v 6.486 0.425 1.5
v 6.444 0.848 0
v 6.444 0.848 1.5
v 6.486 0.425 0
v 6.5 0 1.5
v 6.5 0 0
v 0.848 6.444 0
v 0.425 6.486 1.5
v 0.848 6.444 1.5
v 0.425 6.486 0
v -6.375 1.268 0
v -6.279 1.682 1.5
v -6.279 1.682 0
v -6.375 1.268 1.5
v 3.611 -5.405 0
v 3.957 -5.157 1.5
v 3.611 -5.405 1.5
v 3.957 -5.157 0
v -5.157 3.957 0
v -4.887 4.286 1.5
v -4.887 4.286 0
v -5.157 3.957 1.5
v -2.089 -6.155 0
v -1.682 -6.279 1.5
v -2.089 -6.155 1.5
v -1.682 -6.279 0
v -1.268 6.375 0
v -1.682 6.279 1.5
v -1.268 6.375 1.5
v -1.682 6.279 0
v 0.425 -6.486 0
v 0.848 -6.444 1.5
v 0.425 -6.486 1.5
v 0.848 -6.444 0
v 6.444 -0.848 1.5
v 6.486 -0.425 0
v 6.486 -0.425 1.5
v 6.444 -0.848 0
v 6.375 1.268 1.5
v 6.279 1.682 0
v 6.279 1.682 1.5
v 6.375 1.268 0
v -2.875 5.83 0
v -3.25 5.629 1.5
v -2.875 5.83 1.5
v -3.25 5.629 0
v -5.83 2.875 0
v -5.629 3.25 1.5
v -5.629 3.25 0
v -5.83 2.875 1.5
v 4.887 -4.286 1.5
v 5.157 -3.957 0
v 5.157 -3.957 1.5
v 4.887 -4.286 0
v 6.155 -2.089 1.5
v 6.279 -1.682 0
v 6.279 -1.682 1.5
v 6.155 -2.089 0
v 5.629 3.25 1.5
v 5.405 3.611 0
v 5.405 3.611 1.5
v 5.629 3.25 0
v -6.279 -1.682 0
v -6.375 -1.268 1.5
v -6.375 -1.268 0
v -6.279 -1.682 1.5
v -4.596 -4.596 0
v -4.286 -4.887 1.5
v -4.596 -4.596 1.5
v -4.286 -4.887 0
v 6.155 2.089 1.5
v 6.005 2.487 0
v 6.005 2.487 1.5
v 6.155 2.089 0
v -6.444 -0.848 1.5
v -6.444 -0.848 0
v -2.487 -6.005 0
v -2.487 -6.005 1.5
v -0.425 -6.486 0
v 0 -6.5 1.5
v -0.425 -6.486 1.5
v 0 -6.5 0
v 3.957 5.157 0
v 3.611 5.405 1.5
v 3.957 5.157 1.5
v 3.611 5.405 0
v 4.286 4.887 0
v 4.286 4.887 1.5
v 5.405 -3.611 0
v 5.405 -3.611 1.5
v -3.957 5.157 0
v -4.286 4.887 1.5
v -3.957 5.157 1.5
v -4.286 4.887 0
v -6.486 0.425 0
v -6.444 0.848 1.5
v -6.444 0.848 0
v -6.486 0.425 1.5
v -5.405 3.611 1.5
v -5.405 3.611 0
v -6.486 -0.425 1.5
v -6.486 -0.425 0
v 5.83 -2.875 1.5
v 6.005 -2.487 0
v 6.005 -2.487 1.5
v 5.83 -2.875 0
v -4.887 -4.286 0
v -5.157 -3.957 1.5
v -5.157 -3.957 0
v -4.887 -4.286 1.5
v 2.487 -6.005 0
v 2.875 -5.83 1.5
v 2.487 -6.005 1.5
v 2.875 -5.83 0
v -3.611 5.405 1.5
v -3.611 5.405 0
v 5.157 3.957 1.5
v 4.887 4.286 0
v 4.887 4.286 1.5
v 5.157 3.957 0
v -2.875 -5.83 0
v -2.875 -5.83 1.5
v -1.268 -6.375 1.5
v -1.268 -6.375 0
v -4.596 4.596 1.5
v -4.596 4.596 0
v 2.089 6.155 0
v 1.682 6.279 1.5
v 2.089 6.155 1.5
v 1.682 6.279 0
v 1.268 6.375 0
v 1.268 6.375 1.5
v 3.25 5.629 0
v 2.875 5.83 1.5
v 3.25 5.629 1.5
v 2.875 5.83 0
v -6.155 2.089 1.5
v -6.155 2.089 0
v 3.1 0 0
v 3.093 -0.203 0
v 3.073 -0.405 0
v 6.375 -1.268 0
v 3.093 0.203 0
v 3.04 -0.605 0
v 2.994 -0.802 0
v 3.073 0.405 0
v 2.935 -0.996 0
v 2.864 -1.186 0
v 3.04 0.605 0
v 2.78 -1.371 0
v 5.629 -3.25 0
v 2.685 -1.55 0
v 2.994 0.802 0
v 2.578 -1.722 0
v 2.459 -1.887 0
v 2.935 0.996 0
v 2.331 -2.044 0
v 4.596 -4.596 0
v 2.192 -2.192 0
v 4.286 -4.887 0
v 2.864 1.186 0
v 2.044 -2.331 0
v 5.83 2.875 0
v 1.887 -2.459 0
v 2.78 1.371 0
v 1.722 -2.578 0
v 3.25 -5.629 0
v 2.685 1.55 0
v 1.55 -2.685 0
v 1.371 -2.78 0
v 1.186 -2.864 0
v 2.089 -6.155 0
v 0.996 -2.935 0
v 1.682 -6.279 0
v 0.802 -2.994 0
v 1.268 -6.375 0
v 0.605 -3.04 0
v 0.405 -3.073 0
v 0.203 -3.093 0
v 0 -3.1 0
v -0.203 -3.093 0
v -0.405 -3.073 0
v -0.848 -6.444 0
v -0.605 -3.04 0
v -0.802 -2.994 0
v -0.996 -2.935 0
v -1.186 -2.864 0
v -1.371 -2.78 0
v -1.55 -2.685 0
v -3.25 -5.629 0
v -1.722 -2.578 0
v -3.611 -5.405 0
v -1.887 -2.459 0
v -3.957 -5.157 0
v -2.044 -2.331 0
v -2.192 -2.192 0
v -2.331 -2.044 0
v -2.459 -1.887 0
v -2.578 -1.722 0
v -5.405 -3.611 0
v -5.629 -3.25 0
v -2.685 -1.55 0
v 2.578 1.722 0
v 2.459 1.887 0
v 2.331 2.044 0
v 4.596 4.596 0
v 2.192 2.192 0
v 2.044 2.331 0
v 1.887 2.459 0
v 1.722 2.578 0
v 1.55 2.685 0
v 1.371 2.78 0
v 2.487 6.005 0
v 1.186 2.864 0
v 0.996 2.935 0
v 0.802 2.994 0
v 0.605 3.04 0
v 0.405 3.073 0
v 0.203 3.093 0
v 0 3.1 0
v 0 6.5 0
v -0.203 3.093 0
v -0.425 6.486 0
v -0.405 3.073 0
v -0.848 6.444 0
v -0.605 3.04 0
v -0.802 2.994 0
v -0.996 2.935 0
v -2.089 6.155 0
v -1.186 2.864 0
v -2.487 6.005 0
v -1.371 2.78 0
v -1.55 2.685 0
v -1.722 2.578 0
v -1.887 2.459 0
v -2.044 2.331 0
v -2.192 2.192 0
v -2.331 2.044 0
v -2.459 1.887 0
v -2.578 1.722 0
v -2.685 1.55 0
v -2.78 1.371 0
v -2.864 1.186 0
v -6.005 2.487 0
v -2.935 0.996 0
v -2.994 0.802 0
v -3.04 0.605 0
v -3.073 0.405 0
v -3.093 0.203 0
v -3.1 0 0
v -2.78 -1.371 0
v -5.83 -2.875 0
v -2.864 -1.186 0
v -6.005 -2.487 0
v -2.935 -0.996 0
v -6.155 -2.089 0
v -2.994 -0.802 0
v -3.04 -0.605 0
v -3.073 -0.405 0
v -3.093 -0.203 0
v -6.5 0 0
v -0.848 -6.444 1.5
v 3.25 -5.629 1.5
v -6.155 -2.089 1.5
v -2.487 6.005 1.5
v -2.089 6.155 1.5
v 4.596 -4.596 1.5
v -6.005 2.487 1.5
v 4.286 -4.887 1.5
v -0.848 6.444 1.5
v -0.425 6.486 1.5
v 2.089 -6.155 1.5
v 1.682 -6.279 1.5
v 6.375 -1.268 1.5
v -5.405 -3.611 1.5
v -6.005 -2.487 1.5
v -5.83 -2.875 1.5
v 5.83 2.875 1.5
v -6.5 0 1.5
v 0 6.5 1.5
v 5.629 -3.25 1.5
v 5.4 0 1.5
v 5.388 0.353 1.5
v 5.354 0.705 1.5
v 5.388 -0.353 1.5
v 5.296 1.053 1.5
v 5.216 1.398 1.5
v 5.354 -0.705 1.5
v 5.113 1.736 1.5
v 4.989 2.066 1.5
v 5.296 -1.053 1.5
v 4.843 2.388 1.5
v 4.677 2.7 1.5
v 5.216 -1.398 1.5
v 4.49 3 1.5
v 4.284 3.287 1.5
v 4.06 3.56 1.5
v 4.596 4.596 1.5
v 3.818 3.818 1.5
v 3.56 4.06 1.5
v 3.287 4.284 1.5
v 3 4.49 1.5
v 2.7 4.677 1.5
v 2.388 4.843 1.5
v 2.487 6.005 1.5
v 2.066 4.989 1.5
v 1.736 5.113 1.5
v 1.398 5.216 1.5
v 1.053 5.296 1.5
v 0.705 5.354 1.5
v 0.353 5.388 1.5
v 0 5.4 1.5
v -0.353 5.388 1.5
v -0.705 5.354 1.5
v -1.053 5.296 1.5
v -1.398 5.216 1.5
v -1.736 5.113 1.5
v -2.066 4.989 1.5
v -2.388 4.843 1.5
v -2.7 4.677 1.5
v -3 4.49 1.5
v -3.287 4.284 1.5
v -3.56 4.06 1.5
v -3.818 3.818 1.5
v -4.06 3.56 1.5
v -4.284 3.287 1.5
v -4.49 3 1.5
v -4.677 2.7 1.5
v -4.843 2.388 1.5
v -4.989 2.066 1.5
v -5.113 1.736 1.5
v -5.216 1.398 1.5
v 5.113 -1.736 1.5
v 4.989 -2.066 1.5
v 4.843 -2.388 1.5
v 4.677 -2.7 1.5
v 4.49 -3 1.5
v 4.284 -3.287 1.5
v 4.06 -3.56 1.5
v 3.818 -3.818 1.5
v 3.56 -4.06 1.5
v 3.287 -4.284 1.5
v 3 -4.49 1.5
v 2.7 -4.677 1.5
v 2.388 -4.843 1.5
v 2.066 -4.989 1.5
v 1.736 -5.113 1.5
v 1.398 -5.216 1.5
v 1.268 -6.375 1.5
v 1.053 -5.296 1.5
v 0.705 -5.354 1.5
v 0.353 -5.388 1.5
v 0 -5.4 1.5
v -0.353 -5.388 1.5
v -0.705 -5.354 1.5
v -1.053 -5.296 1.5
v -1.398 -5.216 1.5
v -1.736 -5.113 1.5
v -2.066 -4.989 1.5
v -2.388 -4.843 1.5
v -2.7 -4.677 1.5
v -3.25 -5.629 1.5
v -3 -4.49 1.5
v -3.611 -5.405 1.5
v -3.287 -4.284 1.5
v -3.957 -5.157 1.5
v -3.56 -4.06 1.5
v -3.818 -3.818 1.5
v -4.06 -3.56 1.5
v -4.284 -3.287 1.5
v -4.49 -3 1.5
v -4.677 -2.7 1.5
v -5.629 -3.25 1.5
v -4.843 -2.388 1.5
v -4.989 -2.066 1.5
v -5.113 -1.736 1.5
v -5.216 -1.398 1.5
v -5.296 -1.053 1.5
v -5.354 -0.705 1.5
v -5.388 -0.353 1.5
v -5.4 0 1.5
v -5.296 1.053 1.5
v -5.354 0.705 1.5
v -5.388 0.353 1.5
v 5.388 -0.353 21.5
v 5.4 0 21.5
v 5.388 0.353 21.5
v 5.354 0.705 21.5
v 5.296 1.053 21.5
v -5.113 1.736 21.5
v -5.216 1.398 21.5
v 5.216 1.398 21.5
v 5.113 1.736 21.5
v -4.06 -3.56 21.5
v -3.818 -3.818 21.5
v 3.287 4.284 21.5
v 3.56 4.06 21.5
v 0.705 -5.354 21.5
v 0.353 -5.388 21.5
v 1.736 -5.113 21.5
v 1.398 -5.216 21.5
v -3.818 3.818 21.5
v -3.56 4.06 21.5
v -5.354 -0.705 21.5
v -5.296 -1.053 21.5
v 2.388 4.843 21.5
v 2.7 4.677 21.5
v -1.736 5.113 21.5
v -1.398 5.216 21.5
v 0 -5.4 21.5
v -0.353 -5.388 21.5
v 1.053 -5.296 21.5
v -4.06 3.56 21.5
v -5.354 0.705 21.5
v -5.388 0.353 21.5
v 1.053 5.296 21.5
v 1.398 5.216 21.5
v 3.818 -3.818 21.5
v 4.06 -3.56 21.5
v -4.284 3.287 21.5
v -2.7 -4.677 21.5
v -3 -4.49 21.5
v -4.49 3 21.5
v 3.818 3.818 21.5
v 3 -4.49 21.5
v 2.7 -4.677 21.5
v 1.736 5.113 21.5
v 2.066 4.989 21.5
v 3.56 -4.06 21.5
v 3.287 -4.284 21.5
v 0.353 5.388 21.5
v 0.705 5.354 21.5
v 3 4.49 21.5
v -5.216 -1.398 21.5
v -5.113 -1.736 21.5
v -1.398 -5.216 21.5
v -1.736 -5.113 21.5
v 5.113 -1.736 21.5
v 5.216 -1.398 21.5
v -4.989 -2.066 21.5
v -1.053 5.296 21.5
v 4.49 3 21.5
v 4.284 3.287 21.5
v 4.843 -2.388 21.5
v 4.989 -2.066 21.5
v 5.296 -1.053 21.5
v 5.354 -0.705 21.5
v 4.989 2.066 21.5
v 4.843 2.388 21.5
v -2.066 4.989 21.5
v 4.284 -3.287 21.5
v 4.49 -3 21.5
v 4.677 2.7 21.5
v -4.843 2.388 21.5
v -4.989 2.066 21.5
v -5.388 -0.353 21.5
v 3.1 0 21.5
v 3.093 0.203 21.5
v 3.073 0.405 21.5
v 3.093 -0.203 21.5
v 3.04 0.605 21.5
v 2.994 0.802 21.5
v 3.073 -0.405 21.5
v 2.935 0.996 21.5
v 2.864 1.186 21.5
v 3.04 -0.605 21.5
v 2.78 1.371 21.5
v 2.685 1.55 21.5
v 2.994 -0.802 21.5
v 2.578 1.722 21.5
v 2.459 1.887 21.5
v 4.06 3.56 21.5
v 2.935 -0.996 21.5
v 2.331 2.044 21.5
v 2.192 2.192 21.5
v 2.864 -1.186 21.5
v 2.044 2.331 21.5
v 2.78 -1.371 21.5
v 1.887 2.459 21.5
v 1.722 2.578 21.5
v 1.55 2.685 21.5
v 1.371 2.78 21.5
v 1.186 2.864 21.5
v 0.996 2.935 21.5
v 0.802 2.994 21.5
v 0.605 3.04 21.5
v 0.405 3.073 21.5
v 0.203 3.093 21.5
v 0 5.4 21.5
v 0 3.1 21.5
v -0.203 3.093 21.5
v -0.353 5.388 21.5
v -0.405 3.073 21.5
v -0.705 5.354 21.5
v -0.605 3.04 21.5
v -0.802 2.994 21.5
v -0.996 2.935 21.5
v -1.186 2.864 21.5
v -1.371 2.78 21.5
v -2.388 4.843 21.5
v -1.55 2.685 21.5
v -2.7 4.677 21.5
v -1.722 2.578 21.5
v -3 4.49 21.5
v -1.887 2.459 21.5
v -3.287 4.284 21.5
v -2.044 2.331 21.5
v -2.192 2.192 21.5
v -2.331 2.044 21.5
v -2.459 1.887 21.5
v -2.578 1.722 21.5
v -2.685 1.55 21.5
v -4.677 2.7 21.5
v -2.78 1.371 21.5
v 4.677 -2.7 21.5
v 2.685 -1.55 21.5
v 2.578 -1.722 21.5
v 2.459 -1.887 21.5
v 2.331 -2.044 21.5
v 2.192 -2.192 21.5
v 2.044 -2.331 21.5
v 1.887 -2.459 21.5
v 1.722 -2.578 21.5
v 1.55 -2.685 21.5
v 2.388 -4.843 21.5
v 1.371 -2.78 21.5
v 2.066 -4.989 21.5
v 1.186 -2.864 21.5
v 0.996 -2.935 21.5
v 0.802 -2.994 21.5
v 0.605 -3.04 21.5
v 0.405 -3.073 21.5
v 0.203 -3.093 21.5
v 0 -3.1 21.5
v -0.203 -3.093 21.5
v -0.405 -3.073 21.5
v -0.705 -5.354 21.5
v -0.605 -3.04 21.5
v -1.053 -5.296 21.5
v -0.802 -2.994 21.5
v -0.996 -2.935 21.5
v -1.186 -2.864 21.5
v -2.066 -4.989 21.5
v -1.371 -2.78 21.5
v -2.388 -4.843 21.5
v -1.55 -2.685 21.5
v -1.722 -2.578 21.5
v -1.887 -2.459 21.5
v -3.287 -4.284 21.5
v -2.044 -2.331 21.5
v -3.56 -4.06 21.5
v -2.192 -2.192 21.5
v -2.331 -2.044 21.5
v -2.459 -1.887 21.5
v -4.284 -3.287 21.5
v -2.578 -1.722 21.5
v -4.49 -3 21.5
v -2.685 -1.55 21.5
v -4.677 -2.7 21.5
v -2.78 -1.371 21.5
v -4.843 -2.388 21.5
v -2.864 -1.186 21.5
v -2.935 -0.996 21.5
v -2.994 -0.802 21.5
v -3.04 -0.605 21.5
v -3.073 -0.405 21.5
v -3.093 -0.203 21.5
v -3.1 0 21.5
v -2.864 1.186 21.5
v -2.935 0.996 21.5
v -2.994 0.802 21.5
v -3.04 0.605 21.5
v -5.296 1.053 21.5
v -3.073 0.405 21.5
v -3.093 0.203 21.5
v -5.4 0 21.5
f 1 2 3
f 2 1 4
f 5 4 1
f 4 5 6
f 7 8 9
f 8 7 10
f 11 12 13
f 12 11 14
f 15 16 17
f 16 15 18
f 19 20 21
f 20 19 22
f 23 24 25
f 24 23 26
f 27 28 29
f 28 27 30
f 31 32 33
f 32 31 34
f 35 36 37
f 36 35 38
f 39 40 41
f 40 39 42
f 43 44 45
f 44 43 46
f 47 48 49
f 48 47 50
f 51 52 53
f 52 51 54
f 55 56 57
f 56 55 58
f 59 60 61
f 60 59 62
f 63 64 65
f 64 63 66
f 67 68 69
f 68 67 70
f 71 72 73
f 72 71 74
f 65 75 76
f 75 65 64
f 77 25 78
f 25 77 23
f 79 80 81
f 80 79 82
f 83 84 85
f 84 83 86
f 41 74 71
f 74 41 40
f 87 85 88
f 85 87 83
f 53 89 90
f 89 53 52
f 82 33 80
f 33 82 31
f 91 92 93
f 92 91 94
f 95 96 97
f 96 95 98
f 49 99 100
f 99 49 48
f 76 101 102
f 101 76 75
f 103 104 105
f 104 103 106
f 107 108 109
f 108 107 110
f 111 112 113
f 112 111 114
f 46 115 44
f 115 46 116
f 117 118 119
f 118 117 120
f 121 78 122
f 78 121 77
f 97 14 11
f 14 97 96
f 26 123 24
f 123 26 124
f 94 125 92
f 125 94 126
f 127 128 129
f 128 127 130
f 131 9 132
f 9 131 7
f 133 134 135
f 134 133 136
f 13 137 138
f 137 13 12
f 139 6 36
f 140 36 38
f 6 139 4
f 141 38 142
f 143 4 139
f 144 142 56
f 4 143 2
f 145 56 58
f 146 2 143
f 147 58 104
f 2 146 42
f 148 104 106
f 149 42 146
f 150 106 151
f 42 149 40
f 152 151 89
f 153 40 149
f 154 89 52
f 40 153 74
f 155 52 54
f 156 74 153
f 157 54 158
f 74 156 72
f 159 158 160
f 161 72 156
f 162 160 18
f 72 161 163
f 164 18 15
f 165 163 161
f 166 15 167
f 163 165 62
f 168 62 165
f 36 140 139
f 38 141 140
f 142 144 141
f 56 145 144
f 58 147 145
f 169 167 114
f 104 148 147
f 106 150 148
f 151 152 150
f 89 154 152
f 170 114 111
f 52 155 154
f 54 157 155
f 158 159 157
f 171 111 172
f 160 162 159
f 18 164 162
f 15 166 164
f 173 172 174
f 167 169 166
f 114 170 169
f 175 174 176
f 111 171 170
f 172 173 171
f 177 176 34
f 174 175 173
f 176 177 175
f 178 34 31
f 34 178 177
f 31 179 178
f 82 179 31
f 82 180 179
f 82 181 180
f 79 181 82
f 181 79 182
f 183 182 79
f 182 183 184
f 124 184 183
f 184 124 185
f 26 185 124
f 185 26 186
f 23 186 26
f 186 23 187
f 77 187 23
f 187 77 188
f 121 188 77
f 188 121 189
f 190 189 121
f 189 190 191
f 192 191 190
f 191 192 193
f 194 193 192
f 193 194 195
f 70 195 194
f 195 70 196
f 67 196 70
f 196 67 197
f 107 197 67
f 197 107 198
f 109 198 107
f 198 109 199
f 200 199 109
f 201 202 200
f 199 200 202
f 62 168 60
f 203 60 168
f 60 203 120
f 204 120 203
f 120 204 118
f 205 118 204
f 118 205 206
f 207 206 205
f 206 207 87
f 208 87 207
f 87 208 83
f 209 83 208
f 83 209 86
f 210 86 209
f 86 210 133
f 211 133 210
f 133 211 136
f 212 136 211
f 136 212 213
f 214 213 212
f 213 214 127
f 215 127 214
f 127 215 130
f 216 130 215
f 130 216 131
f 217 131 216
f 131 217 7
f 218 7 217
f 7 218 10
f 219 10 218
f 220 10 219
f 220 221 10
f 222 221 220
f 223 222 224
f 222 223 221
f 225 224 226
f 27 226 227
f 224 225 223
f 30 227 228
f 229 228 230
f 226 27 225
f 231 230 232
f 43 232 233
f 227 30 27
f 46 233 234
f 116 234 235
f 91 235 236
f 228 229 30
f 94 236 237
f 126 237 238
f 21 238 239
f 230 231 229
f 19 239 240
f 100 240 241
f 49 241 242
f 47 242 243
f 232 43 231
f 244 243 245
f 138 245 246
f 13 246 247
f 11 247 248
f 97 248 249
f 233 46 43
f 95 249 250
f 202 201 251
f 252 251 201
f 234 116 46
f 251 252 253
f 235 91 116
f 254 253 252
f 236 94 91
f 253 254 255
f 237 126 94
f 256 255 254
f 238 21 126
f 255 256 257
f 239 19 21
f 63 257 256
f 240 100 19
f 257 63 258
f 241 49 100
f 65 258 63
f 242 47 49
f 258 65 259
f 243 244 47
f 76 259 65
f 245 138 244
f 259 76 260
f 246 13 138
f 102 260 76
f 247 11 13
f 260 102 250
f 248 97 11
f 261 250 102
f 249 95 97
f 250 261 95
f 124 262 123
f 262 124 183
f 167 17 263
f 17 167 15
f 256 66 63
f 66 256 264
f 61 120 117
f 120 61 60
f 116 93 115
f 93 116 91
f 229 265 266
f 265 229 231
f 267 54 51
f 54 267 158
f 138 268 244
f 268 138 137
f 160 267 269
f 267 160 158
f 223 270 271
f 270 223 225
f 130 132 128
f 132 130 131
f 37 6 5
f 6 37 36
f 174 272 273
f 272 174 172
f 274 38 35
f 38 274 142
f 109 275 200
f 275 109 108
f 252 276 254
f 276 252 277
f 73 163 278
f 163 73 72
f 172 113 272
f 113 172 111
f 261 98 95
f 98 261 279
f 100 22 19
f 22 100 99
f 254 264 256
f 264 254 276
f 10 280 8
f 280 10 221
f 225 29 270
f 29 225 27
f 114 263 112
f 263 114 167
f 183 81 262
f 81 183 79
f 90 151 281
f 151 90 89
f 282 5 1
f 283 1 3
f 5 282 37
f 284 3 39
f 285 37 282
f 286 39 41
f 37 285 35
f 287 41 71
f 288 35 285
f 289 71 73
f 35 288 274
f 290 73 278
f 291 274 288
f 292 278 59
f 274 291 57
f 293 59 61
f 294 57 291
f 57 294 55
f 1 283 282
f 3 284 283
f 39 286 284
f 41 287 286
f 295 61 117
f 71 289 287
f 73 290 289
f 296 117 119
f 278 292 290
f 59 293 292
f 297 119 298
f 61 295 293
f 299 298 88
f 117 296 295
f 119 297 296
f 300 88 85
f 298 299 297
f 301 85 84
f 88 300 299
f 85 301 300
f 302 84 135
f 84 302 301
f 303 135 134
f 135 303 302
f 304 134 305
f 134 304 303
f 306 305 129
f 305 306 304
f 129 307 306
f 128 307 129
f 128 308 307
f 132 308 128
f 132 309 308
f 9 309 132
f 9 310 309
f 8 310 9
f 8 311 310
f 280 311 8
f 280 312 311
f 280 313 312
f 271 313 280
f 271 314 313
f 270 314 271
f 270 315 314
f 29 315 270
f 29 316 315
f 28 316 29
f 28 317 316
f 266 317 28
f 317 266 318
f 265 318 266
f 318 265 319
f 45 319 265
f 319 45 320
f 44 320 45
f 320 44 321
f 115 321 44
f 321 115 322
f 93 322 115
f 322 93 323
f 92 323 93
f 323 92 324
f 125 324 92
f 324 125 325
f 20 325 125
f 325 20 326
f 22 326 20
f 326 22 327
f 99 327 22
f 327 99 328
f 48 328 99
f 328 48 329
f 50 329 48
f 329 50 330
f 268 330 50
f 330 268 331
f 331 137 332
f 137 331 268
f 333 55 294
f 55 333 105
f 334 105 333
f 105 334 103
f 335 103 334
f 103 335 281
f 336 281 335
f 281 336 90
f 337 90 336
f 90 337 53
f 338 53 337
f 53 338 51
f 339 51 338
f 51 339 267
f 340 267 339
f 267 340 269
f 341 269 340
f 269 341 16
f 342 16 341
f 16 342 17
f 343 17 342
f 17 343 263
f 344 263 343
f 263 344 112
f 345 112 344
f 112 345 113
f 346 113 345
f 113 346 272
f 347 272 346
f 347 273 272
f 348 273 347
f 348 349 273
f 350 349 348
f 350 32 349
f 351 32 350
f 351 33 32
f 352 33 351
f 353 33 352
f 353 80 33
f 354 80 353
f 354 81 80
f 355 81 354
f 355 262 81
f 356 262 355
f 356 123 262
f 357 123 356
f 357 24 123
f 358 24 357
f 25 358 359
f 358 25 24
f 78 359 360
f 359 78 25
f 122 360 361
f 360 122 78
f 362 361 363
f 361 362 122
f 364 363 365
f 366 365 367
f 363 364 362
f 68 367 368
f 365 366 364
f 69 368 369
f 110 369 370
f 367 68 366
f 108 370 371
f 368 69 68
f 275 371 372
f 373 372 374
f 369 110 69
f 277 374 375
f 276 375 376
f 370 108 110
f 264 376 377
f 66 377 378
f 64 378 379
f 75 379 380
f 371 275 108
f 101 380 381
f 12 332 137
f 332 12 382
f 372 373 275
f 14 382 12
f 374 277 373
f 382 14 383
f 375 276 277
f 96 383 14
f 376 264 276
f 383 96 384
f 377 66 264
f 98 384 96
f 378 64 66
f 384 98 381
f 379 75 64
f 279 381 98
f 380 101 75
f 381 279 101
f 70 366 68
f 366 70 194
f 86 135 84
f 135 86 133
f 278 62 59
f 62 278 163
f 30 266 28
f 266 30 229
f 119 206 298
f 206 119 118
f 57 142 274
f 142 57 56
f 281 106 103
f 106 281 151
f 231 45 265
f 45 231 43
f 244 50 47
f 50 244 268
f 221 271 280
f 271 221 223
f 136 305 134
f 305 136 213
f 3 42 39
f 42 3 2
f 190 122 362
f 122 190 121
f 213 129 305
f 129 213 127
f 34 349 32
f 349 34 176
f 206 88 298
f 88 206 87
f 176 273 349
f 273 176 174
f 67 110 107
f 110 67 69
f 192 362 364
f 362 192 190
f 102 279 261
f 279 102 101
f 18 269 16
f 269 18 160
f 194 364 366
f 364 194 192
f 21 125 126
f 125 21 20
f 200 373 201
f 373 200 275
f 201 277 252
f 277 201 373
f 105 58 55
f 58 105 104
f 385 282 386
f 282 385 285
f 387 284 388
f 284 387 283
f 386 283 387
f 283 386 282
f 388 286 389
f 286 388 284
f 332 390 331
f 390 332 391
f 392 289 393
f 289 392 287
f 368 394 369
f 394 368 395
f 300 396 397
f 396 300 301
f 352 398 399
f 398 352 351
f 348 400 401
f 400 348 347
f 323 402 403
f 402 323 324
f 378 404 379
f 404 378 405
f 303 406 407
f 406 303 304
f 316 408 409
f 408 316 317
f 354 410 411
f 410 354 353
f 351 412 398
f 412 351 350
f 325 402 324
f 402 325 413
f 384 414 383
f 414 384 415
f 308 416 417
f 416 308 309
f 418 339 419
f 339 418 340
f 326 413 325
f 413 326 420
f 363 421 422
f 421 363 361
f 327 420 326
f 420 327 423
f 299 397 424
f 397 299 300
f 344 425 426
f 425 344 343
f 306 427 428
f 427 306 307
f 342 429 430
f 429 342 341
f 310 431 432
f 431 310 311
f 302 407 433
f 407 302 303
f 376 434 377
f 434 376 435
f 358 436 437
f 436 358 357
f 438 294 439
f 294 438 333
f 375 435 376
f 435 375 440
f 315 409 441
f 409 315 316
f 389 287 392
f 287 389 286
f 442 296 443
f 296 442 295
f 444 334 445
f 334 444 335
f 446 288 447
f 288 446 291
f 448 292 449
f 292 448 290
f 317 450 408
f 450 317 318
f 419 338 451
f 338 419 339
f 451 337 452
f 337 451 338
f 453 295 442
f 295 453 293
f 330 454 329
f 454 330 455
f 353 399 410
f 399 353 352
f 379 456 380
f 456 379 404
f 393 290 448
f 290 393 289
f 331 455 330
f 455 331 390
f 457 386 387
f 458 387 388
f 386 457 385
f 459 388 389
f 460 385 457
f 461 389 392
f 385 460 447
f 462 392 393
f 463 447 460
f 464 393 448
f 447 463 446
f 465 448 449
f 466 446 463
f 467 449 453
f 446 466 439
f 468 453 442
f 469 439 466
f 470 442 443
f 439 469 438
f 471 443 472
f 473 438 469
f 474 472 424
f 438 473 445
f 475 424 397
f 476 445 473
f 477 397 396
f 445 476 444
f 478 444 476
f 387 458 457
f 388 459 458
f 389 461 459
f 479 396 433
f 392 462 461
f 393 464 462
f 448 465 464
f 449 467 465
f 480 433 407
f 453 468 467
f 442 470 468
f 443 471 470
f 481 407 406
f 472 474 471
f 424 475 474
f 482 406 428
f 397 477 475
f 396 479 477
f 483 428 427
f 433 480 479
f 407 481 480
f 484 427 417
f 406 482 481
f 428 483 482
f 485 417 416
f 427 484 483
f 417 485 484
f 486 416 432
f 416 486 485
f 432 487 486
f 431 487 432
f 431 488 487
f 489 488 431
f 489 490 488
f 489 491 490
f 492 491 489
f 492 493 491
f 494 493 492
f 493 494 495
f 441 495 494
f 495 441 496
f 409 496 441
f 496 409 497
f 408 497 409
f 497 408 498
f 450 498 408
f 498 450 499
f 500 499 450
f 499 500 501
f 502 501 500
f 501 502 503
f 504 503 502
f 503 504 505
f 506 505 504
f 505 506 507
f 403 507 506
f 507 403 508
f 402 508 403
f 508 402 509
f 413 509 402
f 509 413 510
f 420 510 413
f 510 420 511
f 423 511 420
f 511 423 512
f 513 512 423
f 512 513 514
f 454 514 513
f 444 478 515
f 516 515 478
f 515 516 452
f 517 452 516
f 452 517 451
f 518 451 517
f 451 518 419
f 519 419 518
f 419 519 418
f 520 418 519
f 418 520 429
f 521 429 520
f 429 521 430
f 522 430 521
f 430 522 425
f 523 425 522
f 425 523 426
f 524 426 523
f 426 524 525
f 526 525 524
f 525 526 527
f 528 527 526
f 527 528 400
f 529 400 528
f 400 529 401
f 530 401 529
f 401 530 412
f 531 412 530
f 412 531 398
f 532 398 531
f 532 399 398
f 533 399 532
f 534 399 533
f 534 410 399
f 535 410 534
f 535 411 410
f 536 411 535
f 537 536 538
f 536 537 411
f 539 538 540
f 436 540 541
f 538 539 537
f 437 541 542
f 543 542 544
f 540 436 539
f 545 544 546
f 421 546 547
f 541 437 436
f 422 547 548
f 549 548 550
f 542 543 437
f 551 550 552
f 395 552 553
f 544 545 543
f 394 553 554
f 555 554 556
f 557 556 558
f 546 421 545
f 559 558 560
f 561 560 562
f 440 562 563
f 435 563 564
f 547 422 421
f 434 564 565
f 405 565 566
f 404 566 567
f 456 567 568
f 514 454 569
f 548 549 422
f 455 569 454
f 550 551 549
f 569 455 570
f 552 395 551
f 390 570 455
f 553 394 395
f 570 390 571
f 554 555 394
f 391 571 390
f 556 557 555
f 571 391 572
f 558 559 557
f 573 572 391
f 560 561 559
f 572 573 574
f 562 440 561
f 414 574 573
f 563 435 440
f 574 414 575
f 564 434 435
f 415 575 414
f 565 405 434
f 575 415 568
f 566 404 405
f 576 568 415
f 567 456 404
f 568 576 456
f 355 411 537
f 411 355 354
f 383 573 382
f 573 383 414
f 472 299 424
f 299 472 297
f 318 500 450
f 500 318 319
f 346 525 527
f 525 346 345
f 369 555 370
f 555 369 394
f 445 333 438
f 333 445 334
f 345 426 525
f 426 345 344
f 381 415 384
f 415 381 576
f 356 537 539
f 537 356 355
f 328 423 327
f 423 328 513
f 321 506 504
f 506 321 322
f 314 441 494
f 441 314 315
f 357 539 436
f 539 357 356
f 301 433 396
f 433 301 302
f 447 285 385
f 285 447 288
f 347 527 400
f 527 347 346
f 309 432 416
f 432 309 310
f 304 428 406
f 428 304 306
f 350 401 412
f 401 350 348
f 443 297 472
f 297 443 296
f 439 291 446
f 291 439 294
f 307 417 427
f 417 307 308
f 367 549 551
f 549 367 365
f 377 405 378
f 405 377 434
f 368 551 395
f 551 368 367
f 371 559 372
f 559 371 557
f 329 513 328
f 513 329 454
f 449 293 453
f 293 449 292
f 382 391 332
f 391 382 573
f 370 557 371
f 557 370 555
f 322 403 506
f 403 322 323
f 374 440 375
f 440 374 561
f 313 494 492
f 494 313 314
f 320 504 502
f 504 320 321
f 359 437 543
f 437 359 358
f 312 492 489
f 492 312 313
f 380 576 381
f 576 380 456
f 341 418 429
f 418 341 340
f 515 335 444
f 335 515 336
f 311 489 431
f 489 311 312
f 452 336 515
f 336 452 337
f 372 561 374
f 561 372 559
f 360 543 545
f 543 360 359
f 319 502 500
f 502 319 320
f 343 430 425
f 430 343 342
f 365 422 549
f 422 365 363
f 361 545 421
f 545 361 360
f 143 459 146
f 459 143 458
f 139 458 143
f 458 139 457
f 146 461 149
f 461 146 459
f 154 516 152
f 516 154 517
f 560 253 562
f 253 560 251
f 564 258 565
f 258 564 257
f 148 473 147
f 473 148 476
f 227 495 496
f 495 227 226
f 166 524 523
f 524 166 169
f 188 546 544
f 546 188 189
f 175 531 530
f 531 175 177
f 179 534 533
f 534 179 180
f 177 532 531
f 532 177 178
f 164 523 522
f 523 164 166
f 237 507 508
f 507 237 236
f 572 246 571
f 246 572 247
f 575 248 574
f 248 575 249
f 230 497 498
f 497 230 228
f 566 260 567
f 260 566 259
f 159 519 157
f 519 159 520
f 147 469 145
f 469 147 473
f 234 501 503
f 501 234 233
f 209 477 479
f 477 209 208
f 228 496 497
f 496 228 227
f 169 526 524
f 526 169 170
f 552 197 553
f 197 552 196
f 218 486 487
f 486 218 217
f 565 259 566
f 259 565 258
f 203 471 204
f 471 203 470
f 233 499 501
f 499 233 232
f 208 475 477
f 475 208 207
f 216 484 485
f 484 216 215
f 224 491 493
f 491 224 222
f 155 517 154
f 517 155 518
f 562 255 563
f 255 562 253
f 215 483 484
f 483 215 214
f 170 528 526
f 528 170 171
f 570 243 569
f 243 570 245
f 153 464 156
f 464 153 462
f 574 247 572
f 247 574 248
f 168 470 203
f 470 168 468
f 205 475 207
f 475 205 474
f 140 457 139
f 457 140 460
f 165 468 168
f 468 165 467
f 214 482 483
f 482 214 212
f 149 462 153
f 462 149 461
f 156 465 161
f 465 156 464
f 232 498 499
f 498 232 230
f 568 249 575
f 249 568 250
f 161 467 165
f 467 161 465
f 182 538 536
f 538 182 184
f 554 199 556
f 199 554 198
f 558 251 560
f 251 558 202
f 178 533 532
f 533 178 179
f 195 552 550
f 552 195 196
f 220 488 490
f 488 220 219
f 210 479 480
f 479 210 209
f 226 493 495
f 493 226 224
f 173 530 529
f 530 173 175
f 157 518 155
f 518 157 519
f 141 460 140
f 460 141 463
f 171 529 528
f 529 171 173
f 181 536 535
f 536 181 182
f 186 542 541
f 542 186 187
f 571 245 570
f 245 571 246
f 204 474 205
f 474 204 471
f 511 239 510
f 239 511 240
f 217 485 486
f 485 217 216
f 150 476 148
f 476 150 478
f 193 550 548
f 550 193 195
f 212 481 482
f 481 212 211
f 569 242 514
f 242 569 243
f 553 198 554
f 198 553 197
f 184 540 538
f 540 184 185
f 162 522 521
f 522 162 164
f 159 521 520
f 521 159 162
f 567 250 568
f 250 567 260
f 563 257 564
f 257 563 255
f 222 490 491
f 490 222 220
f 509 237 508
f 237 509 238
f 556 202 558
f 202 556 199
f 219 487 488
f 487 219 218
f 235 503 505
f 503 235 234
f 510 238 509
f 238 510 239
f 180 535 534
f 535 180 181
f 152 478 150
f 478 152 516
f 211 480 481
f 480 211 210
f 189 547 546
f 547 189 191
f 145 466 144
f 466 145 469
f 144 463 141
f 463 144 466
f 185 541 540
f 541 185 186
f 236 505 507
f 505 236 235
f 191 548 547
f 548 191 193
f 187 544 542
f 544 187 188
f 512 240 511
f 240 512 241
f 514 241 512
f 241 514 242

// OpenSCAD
// PCR tube adapter sleeve: prints upside down, collar on bed, open bore through full height
// Units: mm. Print orientation: collar down (z = 0), sleeve body builds upward (+Z).

// ---------------- Parameters ----------------
collar_d          = 13;     // collar outer diameter
collar_t          = 1.5;    // collar thickness (z = 0 to 1.5)
sleeve_d          = 10.8;   // sleeve body outer diameter
sleeve_top_z      = 21.5;   // sleeve body top height (z relative to bed)
bore_d            = 6.2;    // straight through-bore diameter
eps               = 0.5;    // cutter overshoot past faces
$fn               = 96;     // curve resolution

// Derived
sleeve_h          = sleeve_top_z - collar_t;  // sleeve body height (10.0 mm)
total_h           = sleeve_top_z;             // overall height from bed (21.5 mm)
min_d             = min(sleeve_d, bore_d + 2 * eps);  // minimum solid diameter (4.6 mm)

// ---------------- Model ----------------
difference() {
    union() {
        // Collar: disc 13 mm in diameter, 1.5 mm thick, centred on origin in XY
        cylinder(d = collar_d, h = collar_t, $fn = 96);

        // Sleeve body: tube 10.8 mm in outer diameter, 10.0 mm tall, centred on origin in XY
        translate([0, 0, collar_t])
            cylinder(d = sleeve_d, h = sleeve_h, $fn = 96);
    }

    // Through-bore: 6.2 mm diameter, open at both ends, extends eps past each face
    translate([0, 0, -eps])
        cylinder(d = bore_d, h = total_h + 2 * eps, $fn = 96);
}
